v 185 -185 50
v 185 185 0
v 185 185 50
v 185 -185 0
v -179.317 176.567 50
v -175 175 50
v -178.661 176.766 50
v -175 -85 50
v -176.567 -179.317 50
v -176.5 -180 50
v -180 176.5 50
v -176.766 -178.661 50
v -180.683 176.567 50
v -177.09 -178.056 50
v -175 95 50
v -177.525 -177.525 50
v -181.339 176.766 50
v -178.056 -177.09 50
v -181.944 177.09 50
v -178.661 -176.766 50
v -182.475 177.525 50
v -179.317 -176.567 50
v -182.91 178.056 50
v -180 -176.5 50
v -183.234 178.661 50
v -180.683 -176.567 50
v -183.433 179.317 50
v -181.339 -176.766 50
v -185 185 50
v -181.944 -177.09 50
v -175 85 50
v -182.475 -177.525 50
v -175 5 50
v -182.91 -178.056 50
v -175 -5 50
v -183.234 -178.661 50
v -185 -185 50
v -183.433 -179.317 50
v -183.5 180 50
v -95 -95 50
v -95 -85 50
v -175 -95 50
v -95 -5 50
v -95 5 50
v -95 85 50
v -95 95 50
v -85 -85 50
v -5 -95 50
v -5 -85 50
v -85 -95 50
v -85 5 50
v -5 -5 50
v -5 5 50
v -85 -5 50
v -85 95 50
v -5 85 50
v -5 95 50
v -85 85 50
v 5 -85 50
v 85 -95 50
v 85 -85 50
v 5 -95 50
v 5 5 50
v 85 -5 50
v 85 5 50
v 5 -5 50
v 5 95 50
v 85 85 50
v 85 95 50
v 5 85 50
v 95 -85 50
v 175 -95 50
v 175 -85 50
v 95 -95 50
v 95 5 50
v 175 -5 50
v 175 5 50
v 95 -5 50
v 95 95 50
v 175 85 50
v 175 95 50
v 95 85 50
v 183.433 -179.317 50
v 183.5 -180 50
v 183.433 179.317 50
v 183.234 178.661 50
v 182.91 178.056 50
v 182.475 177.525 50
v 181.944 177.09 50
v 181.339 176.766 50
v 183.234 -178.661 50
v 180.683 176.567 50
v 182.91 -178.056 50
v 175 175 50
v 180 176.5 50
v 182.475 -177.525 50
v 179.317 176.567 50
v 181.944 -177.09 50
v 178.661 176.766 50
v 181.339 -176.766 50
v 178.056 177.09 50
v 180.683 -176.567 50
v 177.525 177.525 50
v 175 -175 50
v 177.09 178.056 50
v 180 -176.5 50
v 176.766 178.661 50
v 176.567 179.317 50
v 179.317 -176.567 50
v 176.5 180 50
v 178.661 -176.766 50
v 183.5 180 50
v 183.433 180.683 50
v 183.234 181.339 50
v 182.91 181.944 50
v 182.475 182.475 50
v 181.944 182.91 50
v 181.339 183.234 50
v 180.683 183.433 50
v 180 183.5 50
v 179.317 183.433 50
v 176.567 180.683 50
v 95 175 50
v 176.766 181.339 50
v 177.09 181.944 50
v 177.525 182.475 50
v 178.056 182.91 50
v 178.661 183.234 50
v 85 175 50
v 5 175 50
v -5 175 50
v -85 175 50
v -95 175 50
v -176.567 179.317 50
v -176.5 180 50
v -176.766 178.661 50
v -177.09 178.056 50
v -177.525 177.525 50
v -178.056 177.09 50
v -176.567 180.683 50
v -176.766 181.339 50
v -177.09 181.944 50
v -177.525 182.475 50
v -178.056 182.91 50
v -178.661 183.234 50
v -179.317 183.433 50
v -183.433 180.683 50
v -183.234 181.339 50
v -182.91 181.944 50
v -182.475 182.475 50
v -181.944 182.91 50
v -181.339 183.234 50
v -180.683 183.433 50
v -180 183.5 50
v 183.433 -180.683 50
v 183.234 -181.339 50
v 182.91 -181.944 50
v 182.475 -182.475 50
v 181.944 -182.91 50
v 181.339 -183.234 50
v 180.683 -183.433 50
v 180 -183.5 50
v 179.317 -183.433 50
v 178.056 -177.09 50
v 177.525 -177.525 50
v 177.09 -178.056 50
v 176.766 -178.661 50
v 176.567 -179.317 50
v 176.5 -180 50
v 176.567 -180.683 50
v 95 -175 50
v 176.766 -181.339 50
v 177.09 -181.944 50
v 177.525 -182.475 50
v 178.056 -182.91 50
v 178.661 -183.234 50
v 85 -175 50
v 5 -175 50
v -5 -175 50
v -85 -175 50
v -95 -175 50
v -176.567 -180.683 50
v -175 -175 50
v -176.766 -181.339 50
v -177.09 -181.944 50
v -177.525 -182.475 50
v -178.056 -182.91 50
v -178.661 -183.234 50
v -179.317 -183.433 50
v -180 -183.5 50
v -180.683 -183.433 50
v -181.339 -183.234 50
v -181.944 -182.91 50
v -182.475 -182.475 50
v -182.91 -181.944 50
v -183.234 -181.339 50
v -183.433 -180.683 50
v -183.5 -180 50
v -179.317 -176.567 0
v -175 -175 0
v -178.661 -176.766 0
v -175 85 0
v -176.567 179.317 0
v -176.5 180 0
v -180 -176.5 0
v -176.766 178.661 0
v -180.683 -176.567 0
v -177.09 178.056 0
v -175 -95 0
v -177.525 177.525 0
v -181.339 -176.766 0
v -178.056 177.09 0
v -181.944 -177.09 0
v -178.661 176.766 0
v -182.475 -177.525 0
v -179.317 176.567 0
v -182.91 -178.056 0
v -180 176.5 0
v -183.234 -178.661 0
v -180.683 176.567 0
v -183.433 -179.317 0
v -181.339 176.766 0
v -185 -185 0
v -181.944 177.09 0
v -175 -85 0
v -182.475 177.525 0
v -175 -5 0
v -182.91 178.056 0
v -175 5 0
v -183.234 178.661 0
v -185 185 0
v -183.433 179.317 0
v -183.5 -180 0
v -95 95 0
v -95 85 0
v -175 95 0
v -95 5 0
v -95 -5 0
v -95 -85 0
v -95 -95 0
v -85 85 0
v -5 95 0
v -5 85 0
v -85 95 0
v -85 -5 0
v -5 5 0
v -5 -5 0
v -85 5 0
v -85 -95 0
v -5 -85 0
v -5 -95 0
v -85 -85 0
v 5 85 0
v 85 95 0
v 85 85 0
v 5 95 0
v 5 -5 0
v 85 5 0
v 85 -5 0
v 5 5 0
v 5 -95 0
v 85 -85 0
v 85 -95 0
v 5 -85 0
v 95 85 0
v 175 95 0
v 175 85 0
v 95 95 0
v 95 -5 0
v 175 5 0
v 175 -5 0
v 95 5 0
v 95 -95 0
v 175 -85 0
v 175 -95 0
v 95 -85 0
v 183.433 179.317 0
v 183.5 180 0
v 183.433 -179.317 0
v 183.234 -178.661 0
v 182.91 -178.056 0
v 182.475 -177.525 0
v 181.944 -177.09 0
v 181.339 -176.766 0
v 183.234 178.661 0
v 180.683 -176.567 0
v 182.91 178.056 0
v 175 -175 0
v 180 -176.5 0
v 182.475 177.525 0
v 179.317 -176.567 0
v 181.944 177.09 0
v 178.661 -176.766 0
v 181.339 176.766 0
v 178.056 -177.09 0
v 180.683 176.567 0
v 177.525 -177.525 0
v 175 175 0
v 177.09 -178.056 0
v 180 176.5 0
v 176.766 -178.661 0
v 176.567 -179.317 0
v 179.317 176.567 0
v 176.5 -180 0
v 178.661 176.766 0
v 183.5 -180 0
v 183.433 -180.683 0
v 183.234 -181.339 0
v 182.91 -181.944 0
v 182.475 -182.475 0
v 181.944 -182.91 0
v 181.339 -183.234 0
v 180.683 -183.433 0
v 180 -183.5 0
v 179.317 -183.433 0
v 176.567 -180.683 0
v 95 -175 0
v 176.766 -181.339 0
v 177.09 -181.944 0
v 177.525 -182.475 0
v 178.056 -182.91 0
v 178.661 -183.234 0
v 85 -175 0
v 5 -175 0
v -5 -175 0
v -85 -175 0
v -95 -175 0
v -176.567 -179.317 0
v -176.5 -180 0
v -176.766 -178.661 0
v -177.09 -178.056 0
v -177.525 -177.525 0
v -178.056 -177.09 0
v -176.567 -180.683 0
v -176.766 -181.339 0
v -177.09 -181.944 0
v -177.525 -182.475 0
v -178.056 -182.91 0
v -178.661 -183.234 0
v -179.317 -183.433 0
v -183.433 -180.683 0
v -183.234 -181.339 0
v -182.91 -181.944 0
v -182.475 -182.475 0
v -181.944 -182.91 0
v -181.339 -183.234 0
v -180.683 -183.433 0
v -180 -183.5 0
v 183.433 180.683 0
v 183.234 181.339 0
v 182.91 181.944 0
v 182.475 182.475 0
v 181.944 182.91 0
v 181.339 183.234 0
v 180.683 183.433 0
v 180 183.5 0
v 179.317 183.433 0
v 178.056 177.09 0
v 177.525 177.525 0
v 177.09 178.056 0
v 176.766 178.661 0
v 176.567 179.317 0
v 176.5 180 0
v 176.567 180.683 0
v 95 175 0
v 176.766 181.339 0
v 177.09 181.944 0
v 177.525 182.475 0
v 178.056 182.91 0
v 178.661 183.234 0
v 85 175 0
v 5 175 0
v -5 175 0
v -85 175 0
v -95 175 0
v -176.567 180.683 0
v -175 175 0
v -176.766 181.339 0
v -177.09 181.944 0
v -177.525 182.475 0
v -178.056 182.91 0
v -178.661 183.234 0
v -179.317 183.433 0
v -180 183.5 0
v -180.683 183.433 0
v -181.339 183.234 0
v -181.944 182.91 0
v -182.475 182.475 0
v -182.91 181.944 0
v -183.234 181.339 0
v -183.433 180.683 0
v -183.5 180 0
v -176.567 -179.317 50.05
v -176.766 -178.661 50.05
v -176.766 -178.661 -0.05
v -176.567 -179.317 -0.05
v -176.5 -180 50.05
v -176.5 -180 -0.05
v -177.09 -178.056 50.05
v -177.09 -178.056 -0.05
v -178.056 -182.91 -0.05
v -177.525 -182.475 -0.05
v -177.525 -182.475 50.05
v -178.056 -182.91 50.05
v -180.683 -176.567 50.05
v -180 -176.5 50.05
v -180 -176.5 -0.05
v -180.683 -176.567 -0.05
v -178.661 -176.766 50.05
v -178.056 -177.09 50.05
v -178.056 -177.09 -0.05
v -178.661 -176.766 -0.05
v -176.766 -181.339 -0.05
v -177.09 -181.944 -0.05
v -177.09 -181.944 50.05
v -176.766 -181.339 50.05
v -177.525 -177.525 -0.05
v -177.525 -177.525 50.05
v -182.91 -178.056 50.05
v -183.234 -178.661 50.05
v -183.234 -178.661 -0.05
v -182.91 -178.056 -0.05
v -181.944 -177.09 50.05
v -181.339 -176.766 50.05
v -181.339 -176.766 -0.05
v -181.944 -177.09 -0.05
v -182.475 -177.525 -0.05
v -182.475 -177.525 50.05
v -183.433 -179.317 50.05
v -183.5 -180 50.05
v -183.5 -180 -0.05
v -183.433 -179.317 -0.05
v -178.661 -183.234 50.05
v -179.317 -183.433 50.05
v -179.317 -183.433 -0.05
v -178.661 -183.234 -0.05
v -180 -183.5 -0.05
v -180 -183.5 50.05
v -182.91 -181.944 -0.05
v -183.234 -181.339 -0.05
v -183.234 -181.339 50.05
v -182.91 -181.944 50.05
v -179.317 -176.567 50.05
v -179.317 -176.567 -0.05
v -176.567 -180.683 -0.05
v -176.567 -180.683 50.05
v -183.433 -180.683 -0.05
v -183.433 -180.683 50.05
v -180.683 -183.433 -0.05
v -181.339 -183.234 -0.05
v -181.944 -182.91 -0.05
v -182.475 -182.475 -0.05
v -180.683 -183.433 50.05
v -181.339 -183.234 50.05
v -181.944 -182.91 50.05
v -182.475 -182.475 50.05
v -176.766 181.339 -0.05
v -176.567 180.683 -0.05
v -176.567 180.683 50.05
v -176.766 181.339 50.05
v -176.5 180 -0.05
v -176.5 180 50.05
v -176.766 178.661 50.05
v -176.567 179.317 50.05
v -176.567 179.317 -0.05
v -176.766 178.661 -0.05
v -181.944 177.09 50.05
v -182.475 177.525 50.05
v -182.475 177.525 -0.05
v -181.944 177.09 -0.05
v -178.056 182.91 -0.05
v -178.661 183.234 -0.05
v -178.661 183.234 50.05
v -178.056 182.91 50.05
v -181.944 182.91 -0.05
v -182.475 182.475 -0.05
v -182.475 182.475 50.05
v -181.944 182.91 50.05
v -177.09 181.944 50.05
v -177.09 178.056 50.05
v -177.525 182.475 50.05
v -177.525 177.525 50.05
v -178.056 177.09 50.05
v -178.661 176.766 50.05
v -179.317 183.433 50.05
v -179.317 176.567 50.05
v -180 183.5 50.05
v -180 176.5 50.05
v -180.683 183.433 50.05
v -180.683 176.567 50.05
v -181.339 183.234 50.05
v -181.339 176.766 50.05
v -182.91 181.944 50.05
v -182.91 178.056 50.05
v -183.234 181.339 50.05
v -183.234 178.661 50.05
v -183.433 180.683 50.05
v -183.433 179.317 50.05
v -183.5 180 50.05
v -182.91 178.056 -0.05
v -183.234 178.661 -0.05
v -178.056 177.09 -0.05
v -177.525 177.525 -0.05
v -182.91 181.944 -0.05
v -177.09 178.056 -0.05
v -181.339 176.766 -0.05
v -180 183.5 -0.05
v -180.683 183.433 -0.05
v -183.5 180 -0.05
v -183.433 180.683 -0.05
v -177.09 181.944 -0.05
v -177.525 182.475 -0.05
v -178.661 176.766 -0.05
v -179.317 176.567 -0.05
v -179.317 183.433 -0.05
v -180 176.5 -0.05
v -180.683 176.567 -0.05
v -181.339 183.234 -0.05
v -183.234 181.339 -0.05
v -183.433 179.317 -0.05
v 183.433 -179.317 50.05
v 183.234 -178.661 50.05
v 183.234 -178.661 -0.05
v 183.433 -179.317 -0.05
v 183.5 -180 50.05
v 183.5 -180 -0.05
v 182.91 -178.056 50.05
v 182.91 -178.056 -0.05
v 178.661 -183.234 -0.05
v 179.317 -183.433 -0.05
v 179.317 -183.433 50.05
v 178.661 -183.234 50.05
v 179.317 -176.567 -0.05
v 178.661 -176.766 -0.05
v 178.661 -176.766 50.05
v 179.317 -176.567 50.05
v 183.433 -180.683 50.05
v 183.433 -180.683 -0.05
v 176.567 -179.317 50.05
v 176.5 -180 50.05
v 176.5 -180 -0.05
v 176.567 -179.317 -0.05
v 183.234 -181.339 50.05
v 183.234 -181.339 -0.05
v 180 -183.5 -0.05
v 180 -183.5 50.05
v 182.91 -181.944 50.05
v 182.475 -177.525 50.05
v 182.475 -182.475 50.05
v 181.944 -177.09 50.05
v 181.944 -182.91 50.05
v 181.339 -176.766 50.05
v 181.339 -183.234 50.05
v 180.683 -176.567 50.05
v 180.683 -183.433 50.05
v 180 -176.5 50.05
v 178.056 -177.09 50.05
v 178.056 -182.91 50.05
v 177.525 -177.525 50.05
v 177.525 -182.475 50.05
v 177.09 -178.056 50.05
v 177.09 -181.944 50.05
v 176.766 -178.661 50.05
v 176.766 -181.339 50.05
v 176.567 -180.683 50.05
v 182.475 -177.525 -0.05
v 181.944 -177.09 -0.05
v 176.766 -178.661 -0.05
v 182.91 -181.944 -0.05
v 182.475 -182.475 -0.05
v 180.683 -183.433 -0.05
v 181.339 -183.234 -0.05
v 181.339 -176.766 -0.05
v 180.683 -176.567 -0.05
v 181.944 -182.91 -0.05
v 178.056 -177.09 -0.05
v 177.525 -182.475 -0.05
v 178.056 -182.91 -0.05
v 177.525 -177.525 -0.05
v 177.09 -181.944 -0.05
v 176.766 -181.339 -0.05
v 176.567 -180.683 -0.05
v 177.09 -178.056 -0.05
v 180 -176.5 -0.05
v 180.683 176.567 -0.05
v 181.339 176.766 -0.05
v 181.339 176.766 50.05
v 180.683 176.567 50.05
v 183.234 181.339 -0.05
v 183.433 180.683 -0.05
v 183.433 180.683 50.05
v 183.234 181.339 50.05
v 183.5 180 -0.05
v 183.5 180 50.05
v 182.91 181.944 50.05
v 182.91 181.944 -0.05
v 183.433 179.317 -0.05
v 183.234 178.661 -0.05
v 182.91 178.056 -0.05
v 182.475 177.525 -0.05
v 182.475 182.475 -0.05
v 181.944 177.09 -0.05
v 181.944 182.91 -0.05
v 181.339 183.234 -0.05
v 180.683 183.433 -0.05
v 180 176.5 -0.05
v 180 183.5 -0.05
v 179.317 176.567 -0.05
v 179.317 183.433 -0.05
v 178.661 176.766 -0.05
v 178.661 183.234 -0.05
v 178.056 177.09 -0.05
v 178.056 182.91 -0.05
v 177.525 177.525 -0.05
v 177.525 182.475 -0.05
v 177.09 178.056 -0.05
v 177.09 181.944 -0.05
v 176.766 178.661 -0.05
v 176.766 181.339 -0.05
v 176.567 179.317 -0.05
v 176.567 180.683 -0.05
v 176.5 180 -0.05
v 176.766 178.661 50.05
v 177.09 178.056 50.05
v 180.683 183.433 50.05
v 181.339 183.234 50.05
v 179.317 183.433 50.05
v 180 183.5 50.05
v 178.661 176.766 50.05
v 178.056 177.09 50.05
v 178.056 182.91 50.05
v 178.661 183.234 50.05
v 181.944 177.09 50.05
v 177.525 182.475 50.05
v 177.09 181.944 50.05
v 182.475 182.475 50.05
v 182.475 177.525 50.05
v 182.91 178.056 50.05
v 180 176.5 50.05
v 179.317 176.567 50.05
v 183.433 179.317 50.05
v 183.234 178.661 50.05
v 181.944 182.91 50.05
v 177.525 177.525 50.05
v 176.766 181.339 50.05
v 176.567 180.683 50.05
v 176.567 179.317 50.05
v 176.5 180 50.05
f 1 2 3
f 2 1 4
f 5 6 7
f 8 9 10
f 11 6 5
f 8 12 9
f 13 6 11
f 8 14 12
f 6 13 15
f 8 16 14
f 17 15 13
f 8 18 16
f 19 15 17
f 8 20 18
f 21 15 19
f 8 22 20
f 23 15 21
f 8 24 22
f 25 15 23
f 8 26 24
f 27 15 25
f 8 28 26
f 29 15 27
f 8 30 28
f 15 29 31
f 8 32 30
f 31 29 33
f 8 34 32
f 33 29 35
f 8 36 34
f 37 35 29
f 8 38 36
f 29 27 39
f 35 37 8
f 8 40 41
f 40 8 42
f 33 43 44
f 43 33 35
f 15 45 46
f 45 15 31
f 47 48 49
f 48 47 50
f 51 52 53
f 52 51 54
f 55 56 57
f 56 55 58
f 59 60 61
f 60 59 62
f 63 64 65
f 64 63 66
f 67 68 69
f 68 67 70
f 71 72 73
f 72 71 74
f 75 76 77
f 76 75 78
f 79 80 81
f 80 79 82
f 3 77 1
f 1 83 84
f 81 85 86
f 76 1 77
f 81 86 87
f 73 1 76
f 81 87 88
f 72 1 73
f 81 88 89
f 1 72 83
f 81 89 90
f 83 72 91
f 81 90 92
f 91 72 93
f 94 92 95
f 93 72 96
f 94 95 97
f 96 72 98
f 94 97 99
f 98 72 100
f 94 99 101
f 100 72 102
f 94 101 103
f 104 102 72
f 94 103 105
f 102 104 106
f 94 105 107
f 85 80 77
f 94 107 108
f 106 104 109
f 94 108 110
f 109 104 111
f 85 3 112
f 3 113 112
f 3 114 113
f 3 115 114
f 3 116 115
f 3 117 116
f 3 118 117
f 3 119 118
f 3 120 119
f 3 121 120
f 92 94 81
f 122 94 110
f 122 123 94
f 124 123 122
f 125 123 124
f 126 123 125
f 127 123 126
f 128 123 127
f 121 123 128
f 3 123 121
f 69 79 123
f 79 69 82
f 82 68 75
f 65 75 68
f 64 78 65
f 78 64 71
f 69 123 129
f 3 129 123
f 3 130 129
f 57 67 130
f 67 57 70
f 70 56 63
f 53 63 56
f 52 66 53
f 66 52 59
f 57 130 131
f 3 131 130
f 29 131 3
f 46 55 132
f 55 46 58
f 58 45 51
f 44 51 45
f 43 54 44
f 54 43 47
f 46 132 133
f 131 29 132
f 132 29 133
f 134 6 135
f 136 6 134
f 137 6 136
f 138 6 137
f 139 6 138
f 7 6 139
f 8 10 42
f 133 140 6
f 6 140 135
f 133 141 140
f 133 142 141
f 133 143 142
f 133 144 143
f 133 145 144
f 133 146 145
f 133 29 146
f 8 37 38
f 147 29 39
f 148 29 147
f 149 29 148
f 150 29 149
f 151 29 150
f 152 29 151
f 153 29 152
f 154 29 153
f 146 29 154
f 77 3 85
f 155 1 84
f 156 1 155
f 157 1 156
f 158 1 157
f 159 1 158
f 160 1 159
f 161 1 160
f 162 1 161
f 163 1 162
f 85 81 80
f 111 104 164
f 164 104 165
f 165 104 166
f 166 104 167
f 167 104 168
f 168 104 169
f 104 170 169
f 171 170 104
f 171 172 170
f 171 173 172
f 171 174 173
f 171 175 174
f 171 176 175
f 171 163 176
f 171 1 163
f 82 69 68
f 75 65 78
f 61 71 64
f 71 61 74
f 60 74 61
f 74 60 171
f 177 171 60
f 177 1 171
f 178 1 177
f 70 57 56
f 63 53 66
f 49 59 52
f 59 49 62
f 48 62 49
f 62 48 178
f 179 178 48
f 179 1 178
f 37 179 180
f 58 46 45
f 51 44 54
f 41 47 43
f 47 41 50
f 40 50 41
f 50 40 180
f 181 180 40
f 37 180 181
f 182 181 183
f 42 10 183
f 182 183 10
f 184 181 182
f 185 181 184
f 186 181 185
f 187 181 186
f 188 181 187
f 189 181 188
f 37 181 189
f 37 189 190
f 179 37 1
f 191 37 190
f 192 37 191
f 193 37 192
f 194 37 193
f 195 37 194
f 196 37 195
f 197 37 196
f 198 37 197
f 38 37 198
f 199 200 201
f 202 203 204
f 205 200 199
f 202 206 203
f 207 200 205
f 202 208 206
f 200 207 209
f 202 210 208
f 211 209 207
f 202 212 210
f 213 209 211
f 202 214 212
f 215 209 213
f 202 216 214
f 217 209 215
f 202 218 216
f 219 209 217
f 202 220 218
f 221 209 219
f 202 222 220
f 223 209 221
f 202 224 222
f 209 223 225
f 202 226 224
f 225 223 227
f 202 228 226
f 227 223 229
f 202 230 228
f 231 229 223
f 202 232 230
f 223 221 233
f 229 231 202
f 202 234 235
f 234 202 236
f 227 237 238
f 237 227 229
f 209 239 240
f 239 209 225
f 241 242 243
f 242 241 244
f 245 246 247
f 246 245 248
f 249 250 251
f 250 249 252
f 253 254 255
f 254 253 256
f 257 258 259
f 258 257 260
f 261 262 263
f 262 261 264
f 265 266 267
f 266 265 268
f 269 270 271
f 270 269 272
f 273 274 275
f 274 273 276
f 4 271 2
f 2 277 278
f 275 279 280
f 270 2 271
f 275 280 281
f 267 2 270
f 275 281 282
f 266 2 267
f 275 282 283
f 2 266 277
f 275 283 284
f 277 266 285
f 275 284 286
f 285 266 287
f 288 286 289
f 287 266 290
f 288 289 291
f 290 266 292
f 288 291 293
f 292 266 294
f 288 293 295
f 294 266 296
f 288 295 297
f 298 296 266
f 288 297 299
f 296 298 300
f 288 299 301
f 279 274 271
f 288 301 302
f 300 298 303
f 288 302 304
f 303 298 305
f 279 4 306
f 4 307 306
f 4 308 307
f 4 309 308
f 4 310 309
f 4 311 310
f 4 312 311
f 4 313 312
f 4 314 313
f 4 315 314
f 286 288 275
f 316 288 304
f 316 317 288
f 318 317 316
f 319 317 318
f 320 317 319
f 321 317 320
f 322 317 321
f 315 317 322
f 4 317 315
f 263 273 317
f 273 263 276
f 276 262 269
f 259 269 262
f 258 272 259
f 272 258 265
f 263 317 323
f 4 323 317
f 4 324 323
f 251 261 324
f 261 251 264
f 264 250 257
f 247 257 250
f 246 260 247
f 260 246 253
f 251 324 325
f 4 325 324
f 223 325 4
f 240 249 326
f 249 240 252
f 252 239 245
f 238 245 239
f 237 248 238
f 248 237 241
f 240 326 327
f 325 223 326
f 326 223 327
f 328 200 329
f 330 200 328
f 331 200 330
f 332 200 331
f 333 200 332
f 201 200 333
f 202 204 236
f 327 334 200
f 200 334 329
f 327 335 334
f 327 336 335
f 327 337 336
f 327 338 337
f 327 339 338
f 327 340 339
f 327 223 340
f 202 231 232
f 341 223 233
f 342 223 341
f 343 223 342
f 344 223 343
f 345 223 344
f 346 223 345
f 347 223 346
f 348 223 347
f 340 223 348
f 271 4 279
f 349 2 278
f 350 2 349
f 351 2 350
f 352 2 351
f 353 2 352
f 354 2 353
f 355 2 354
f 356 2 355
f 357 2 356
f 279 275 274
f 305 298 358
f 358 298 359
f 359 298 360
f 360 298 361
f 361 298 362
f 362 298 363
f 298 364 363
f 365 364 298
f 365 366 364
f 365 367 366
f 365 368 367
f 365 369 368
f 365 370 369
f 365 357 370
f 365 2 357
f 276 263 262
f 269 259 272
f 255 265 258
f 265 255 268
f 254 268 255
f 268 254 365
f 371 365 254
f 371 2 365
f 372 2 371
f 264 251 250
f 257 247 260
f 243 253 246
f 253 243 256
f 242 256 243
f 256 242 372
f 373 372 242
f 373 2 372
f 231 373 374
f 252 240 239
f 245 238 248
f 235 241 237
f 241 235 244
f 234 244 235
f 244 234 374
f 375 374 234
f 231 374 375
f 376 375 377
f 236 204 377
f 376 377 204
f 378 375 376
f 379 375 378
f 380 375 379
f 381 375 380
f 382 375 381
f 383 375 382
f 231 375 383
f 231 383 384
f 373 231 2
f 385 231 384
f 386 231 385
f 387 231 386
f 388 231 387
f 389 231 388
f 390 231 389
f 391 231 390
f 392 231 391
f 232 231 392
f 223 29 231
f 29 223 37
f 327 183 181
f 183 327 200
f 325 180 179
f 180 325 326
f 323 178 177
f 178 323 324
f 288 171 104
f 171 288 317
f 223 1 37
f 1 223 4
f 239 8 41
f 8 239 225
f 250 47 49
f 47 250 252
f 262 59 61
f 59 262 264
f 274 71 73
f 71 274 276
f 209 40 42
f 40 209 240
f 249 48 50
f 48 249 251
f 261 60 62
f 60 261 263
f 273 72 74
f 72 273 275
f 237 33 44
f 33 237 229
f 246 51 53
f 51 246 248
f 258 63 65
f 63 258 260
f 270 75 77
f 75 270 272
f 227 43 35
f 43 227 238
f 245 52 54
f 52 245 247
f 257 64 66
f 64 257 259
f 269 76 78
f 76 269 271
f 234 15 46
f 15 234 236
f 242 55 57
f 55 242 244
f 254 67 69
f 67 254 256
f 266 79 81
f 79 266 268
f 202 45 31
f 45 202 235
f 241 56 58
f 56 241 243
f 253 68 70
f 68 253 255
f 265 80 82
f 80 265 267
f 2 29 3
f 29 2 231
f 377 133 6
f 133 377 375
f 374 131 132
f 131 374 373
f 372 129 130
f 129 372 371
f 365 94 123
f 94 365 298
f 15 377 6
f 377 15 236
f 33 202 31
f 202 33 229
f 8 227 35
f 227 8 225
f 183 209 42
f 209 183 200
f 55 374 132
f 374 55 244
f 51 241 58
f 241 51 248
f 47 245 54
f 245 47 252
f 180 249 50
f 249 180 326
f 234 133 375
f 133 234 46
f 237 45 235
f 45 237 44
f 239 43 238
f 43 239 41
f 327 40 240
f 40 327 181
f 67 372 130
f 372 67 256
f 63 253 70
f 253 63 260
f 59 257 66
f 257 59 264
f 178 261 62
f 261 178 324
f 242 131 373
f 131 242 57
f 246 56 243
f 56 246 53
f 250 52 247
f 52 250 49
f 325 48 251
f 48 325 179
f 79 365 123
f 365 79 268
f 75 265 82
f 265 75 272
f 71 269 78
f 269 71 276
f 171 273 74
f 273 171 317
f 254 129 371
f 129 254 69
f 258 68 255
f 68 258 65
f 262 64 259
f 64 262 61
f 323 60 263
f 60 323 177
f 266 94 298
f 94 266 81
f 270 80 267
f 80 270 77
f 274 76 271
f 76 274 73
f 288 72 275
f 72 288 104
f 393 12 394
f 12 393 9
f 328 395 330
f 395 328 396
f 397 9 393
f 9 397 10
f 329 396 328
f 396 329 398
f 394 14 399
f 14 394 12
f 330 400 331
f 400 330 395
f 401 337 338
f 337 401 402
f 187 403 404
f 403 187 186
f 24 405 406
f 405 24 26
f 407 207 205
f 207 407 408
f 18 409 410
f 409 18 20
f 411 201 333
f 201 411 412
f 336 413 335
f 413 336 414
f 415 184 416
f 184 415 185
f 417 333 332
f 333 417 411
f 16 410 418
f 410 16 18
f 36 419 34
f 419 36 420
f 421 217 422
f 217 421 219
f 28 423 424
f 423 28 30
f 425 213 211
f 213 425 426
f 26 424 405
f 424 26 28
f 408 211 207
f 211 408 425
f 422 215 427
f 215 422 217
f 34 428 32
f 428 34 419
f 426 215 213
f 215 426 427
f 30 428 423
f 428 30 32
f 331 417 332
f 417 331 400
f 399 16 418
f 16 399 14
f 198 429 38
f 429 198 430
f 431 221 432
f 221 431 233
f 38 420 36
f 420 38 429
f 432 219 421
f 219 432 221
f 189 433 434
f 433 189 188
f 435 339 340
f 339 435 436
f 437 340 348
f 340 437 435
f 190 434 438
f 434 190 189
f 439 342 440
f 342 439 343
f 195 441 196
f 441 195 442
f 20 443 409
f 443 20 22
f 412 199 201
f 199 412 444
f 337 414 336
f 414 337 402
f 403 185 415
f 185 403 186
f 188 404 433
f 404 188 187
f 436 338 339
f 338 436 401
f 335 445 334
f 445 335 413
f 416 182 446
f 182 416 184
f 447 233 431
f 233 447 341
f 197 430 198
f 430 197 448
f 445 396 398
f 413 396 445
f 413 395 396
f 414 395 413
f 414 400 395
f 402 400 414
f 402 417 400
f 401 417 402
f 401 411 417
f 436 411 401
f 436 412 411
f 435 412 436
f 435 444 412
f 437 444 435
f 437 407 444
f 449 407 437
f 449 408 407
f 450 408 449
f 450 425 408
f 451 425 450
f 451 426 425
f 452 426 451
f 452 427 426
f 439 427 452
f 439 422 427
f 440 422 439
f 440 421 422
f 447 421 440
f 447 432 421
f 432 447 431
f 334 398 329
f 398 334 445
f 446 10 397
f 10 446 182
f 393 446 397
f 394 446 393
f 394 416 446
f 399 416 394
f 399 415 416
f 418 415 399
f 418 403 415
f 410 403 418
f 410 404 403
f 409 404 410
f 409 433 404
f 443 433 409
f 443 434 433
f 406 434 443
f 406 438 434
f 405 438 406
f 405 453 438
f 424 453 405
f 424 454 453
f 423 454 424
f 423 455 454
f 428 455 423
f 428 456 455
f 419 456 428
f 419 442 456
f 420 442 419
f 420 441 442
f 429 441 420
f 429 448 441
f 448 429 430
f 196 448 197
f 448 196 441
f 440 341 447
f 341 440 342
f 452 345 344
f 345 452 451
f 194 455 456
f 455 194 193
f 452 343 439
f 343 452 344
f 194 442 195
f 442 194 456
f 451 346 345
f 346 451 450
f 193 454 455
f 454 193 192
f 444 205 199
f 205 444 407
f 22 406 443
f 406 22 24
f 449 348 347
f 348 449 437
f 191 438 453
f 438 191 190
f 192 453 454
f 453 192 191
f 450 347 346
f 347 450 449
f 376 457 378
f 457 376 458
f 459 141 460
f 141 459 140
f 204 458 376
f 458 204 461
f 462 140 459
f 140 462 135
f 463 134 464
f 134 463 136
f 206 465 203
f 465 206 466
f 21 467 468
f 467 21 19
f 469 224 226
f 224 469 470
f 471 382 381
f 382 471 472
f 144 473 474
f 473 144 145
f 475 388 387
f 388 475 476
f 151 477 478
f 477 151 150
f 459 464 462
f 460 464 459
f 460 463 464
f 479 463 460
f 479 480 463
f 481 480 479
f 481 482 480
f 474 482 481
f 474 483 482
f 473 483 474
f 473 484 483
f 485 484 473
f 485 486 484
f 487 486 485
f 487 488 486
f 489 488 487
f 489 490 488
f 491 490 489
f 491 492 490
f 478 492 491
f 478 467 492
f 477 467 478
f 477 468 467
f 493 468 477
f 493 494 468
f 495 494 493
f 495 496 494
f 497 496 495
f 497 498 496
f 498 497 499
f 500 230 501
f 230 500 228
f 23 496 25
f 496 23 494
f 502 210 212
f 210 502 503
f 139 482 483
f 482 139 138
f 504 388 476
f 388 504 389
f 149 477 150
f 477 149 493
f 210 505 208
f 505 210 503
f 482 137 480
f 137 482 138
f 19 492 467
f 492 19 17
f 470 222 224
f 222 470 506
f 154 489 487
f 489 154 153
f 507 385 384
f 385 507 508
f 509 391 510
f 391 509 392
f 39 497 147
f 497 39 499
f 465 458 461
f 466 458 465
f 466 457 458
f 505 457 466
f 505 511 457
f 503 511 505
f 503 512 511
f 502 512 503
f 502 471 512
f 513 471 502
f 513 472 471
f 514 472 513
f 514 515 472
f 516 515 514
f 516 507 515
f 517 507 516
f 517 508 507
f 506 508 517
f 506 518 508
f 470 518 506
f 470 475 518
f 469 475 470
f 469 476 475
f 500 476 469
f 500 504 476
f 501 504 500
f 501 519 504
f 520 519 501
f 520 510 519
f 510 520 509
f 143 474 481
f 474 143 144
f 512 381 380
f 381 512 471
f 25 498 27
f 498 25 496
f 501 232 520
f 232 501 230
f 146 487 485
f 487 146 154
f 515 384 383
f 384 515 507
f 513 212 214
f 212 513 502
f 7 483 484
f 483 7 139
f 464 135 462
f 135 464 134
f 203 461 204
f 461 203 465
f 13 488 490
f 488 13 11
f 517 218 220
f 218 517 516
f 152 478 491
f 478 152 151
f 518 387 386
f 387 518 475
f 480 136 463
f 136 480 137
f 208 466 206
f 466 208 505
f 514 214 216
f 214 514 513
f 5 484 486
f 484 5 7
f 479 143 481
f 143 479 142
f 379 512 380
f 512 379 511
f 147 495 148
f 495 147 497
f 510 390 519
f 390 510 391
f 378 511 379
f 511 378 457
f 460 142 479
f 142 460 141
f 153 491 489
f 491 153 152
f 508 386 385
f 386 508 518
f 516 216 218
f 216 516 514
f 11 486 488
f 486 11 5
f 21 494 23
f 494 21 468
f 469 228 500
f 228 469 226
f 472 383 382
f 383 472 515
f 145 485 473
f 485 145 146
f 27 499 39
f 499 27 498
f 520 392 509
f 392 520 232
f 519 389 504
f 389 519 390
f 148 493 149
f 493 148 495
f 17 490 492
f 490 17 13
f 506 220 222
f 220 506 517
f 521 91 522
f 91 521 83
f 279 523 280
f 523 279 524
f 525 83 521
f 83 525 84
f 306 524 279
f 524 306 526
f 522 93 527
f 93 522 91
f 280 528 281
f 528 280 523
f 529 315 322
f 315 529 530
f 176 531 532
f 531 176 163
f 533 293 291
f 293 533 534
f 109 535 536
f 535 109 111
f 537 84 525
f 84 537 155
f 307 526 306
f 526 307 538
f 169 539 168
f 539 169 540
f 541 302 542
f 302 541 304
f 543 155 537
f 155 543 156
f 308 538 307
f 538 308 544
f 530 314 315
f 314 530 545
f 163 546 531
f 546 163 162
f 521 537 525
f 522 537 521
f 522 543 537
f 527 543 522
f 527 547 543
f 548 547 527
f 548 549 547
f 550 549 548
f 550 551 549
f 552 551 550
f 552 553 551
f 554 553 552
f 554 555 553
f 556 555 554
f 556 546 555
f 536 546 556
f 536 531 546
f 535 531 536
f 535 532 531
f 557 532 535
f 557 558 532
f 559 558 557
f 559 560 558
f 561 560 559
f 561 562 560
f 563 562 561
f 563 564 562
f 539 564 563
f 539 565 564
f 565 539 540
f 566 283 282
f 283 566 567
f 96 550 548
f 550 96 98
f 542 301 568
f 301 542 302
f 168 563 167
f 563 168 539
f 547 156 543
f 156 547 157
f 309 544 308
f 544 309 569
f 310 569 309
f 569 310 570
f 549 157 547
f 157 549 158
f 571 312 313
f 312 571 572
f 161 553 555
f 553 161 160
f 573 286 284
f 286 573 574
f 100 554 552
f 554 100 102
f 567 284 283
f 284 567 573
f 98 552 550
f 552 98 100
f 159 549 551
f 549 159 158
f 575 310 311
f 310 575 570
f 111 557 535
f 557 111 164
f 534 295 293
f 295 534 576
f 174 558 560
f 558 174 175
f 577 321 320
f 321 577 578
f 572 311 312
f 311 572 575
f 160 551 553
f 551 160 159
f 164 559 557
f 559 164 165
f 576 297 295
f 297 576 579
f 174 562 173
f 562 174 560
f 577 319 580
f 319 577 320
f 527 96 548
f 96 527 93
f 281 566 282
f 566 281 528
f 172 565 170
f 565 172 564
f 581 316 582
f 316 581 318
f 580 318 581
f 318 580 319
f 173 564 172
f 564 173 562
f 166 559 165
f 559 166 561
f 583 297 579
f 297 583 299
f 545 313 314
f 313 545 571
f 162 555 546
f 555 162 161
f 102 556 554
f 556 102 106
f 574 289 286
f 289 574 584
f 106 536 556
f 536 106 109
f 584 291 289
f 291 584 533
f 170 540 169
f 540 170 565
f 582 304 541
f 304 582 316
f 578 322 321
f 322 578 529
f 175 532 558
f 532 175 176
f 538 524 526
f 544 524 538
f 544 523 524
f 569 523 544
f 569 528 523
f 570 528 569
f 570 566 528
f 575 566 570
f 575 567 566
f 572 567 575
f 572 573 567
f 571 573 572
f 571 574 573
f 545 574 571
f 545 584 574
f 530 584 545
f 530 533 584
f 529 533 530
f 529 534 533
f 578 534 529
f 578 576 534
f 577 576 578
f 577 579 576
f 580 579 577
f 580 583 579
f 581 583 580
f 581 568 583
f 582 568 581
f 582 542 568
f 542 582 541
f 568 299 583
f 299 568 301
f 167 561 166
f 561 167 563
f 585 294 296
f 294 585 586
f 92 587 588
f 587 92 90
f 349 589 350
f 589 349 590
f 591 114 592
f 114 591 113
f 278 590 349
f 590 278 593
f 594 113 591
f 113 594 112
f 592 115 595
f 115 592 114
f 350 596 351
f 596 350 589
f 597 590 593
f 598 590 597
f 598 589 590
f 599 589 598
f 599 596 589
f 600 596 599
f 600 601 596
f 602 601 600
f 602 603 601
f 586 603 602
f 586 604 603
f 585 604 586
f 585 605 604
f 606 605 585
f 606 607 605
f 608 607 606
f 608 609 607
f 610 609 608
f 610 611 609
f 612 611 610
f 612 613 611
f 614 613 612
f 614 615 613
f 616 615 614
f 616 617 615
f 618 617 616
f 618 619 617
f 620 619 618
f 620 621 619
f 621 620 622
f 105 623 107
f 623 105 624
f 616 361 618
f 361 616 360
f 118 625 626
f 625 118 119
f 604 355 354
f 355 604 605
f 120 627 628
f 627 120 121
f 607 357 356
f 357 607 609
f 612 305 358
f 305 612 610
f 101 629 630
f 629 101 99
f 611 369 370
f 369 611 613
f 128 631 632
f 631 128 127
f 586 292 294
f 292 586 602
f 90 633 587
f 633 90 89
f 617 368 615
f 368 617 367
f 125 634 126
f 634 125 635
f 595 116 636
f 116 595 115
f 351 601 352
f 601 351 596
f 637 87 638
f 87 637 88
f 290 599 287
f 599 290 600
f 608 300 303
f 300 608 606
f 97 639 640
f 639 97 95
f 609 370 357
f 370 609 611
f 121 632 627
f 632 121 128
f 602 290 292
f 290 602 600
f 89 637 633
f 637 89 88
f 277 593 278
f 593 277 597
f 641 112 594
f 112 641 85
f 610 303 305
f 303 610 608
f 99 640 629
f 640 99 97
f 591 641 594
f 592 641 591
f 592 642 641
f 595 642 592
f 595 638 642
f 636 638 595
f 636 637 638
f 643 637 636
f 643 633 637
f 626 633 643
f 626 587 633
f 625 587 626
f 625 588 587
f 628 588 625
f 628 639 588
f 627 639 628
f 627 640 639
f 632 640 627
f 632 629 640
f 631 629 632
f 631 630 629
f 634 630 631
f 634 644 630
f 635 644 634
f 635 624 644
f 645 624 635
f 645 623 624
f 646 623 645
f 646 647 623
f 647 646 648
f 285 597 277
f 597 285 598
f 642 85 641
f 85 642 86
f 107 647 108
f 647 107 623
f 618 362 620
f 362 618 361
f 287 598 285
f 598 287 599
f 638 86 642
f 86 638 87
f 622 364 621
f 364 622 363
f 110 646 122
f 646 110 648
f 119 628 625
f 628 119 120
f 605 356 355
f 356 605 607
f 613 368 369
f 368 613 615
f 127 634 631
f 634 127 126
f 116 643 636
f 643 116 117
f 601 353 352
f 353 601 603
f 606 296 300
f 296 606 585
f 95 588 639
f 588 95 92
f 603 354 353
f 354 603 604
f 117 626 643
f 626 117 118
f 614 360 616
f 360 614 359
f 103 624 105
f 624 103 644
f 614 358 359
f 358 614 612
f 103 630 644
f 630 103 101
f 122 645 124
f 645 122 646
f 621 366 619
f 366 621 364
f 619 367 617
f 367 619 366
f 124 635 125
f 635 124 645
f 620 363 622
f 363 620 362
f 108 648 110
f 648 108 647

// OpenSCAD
// Part Name: Cage_Layer_3_H50mm
// This part represents a horizontal slice of the cage.
// It is designed to be 3D printed on its base.

// Parameters for the cage
bar_t = 10;
gap_xy = 80;
hole_d = 7;
cage_ext_xy = 370;

// Calculate bar center positions relative to the overall cage center
bar_centers_xy = [for (j = [0:4]) (-cage_ext_xy/2 + bar_t/2 + j * (bar_t + gap_xy))];

// Module to generate a single layer segment
module cage_layer_segment(height) {
    // Offset for printing on z=0 plane. The module itself is centered on XY=0, so this Z offset moves its base to Z=0.
    translate([0, 0, height/2]) {
        union() {
            // Horizontal bars (along X)
            for (y_center = bar_centers_xy) {
                translate([0, y_center, 0])
                cube([cage_ext_xy, bar_t, height], center = true);
            }

            // Vertical bars (along Y)
            for (x_center = bar_centers_xy) {
                translate([x_center, 0, 0])
                cube([bar_t, cage_ext_xy, height], center = true);
            }

            // Subtract holes for M6 rods at the 4 corners
            corner_offsets_xy = [bar_centers_xy[0], bar_centers_xy[4]];

            for (x_offset = corner_offsets_xy) {
                for (y_offset = corner_offsets_xy) {
                    // Hole through the center of the corner bar
                    translate([x_offset, y_offset, 0])
                    cylinder(h = height + 0.1, d = hole_d, center = true, $fn=32); // +0.1 for clean cut
                }
            }
        }
    }
}

// Render the segment
cage_layer_segment(50);
